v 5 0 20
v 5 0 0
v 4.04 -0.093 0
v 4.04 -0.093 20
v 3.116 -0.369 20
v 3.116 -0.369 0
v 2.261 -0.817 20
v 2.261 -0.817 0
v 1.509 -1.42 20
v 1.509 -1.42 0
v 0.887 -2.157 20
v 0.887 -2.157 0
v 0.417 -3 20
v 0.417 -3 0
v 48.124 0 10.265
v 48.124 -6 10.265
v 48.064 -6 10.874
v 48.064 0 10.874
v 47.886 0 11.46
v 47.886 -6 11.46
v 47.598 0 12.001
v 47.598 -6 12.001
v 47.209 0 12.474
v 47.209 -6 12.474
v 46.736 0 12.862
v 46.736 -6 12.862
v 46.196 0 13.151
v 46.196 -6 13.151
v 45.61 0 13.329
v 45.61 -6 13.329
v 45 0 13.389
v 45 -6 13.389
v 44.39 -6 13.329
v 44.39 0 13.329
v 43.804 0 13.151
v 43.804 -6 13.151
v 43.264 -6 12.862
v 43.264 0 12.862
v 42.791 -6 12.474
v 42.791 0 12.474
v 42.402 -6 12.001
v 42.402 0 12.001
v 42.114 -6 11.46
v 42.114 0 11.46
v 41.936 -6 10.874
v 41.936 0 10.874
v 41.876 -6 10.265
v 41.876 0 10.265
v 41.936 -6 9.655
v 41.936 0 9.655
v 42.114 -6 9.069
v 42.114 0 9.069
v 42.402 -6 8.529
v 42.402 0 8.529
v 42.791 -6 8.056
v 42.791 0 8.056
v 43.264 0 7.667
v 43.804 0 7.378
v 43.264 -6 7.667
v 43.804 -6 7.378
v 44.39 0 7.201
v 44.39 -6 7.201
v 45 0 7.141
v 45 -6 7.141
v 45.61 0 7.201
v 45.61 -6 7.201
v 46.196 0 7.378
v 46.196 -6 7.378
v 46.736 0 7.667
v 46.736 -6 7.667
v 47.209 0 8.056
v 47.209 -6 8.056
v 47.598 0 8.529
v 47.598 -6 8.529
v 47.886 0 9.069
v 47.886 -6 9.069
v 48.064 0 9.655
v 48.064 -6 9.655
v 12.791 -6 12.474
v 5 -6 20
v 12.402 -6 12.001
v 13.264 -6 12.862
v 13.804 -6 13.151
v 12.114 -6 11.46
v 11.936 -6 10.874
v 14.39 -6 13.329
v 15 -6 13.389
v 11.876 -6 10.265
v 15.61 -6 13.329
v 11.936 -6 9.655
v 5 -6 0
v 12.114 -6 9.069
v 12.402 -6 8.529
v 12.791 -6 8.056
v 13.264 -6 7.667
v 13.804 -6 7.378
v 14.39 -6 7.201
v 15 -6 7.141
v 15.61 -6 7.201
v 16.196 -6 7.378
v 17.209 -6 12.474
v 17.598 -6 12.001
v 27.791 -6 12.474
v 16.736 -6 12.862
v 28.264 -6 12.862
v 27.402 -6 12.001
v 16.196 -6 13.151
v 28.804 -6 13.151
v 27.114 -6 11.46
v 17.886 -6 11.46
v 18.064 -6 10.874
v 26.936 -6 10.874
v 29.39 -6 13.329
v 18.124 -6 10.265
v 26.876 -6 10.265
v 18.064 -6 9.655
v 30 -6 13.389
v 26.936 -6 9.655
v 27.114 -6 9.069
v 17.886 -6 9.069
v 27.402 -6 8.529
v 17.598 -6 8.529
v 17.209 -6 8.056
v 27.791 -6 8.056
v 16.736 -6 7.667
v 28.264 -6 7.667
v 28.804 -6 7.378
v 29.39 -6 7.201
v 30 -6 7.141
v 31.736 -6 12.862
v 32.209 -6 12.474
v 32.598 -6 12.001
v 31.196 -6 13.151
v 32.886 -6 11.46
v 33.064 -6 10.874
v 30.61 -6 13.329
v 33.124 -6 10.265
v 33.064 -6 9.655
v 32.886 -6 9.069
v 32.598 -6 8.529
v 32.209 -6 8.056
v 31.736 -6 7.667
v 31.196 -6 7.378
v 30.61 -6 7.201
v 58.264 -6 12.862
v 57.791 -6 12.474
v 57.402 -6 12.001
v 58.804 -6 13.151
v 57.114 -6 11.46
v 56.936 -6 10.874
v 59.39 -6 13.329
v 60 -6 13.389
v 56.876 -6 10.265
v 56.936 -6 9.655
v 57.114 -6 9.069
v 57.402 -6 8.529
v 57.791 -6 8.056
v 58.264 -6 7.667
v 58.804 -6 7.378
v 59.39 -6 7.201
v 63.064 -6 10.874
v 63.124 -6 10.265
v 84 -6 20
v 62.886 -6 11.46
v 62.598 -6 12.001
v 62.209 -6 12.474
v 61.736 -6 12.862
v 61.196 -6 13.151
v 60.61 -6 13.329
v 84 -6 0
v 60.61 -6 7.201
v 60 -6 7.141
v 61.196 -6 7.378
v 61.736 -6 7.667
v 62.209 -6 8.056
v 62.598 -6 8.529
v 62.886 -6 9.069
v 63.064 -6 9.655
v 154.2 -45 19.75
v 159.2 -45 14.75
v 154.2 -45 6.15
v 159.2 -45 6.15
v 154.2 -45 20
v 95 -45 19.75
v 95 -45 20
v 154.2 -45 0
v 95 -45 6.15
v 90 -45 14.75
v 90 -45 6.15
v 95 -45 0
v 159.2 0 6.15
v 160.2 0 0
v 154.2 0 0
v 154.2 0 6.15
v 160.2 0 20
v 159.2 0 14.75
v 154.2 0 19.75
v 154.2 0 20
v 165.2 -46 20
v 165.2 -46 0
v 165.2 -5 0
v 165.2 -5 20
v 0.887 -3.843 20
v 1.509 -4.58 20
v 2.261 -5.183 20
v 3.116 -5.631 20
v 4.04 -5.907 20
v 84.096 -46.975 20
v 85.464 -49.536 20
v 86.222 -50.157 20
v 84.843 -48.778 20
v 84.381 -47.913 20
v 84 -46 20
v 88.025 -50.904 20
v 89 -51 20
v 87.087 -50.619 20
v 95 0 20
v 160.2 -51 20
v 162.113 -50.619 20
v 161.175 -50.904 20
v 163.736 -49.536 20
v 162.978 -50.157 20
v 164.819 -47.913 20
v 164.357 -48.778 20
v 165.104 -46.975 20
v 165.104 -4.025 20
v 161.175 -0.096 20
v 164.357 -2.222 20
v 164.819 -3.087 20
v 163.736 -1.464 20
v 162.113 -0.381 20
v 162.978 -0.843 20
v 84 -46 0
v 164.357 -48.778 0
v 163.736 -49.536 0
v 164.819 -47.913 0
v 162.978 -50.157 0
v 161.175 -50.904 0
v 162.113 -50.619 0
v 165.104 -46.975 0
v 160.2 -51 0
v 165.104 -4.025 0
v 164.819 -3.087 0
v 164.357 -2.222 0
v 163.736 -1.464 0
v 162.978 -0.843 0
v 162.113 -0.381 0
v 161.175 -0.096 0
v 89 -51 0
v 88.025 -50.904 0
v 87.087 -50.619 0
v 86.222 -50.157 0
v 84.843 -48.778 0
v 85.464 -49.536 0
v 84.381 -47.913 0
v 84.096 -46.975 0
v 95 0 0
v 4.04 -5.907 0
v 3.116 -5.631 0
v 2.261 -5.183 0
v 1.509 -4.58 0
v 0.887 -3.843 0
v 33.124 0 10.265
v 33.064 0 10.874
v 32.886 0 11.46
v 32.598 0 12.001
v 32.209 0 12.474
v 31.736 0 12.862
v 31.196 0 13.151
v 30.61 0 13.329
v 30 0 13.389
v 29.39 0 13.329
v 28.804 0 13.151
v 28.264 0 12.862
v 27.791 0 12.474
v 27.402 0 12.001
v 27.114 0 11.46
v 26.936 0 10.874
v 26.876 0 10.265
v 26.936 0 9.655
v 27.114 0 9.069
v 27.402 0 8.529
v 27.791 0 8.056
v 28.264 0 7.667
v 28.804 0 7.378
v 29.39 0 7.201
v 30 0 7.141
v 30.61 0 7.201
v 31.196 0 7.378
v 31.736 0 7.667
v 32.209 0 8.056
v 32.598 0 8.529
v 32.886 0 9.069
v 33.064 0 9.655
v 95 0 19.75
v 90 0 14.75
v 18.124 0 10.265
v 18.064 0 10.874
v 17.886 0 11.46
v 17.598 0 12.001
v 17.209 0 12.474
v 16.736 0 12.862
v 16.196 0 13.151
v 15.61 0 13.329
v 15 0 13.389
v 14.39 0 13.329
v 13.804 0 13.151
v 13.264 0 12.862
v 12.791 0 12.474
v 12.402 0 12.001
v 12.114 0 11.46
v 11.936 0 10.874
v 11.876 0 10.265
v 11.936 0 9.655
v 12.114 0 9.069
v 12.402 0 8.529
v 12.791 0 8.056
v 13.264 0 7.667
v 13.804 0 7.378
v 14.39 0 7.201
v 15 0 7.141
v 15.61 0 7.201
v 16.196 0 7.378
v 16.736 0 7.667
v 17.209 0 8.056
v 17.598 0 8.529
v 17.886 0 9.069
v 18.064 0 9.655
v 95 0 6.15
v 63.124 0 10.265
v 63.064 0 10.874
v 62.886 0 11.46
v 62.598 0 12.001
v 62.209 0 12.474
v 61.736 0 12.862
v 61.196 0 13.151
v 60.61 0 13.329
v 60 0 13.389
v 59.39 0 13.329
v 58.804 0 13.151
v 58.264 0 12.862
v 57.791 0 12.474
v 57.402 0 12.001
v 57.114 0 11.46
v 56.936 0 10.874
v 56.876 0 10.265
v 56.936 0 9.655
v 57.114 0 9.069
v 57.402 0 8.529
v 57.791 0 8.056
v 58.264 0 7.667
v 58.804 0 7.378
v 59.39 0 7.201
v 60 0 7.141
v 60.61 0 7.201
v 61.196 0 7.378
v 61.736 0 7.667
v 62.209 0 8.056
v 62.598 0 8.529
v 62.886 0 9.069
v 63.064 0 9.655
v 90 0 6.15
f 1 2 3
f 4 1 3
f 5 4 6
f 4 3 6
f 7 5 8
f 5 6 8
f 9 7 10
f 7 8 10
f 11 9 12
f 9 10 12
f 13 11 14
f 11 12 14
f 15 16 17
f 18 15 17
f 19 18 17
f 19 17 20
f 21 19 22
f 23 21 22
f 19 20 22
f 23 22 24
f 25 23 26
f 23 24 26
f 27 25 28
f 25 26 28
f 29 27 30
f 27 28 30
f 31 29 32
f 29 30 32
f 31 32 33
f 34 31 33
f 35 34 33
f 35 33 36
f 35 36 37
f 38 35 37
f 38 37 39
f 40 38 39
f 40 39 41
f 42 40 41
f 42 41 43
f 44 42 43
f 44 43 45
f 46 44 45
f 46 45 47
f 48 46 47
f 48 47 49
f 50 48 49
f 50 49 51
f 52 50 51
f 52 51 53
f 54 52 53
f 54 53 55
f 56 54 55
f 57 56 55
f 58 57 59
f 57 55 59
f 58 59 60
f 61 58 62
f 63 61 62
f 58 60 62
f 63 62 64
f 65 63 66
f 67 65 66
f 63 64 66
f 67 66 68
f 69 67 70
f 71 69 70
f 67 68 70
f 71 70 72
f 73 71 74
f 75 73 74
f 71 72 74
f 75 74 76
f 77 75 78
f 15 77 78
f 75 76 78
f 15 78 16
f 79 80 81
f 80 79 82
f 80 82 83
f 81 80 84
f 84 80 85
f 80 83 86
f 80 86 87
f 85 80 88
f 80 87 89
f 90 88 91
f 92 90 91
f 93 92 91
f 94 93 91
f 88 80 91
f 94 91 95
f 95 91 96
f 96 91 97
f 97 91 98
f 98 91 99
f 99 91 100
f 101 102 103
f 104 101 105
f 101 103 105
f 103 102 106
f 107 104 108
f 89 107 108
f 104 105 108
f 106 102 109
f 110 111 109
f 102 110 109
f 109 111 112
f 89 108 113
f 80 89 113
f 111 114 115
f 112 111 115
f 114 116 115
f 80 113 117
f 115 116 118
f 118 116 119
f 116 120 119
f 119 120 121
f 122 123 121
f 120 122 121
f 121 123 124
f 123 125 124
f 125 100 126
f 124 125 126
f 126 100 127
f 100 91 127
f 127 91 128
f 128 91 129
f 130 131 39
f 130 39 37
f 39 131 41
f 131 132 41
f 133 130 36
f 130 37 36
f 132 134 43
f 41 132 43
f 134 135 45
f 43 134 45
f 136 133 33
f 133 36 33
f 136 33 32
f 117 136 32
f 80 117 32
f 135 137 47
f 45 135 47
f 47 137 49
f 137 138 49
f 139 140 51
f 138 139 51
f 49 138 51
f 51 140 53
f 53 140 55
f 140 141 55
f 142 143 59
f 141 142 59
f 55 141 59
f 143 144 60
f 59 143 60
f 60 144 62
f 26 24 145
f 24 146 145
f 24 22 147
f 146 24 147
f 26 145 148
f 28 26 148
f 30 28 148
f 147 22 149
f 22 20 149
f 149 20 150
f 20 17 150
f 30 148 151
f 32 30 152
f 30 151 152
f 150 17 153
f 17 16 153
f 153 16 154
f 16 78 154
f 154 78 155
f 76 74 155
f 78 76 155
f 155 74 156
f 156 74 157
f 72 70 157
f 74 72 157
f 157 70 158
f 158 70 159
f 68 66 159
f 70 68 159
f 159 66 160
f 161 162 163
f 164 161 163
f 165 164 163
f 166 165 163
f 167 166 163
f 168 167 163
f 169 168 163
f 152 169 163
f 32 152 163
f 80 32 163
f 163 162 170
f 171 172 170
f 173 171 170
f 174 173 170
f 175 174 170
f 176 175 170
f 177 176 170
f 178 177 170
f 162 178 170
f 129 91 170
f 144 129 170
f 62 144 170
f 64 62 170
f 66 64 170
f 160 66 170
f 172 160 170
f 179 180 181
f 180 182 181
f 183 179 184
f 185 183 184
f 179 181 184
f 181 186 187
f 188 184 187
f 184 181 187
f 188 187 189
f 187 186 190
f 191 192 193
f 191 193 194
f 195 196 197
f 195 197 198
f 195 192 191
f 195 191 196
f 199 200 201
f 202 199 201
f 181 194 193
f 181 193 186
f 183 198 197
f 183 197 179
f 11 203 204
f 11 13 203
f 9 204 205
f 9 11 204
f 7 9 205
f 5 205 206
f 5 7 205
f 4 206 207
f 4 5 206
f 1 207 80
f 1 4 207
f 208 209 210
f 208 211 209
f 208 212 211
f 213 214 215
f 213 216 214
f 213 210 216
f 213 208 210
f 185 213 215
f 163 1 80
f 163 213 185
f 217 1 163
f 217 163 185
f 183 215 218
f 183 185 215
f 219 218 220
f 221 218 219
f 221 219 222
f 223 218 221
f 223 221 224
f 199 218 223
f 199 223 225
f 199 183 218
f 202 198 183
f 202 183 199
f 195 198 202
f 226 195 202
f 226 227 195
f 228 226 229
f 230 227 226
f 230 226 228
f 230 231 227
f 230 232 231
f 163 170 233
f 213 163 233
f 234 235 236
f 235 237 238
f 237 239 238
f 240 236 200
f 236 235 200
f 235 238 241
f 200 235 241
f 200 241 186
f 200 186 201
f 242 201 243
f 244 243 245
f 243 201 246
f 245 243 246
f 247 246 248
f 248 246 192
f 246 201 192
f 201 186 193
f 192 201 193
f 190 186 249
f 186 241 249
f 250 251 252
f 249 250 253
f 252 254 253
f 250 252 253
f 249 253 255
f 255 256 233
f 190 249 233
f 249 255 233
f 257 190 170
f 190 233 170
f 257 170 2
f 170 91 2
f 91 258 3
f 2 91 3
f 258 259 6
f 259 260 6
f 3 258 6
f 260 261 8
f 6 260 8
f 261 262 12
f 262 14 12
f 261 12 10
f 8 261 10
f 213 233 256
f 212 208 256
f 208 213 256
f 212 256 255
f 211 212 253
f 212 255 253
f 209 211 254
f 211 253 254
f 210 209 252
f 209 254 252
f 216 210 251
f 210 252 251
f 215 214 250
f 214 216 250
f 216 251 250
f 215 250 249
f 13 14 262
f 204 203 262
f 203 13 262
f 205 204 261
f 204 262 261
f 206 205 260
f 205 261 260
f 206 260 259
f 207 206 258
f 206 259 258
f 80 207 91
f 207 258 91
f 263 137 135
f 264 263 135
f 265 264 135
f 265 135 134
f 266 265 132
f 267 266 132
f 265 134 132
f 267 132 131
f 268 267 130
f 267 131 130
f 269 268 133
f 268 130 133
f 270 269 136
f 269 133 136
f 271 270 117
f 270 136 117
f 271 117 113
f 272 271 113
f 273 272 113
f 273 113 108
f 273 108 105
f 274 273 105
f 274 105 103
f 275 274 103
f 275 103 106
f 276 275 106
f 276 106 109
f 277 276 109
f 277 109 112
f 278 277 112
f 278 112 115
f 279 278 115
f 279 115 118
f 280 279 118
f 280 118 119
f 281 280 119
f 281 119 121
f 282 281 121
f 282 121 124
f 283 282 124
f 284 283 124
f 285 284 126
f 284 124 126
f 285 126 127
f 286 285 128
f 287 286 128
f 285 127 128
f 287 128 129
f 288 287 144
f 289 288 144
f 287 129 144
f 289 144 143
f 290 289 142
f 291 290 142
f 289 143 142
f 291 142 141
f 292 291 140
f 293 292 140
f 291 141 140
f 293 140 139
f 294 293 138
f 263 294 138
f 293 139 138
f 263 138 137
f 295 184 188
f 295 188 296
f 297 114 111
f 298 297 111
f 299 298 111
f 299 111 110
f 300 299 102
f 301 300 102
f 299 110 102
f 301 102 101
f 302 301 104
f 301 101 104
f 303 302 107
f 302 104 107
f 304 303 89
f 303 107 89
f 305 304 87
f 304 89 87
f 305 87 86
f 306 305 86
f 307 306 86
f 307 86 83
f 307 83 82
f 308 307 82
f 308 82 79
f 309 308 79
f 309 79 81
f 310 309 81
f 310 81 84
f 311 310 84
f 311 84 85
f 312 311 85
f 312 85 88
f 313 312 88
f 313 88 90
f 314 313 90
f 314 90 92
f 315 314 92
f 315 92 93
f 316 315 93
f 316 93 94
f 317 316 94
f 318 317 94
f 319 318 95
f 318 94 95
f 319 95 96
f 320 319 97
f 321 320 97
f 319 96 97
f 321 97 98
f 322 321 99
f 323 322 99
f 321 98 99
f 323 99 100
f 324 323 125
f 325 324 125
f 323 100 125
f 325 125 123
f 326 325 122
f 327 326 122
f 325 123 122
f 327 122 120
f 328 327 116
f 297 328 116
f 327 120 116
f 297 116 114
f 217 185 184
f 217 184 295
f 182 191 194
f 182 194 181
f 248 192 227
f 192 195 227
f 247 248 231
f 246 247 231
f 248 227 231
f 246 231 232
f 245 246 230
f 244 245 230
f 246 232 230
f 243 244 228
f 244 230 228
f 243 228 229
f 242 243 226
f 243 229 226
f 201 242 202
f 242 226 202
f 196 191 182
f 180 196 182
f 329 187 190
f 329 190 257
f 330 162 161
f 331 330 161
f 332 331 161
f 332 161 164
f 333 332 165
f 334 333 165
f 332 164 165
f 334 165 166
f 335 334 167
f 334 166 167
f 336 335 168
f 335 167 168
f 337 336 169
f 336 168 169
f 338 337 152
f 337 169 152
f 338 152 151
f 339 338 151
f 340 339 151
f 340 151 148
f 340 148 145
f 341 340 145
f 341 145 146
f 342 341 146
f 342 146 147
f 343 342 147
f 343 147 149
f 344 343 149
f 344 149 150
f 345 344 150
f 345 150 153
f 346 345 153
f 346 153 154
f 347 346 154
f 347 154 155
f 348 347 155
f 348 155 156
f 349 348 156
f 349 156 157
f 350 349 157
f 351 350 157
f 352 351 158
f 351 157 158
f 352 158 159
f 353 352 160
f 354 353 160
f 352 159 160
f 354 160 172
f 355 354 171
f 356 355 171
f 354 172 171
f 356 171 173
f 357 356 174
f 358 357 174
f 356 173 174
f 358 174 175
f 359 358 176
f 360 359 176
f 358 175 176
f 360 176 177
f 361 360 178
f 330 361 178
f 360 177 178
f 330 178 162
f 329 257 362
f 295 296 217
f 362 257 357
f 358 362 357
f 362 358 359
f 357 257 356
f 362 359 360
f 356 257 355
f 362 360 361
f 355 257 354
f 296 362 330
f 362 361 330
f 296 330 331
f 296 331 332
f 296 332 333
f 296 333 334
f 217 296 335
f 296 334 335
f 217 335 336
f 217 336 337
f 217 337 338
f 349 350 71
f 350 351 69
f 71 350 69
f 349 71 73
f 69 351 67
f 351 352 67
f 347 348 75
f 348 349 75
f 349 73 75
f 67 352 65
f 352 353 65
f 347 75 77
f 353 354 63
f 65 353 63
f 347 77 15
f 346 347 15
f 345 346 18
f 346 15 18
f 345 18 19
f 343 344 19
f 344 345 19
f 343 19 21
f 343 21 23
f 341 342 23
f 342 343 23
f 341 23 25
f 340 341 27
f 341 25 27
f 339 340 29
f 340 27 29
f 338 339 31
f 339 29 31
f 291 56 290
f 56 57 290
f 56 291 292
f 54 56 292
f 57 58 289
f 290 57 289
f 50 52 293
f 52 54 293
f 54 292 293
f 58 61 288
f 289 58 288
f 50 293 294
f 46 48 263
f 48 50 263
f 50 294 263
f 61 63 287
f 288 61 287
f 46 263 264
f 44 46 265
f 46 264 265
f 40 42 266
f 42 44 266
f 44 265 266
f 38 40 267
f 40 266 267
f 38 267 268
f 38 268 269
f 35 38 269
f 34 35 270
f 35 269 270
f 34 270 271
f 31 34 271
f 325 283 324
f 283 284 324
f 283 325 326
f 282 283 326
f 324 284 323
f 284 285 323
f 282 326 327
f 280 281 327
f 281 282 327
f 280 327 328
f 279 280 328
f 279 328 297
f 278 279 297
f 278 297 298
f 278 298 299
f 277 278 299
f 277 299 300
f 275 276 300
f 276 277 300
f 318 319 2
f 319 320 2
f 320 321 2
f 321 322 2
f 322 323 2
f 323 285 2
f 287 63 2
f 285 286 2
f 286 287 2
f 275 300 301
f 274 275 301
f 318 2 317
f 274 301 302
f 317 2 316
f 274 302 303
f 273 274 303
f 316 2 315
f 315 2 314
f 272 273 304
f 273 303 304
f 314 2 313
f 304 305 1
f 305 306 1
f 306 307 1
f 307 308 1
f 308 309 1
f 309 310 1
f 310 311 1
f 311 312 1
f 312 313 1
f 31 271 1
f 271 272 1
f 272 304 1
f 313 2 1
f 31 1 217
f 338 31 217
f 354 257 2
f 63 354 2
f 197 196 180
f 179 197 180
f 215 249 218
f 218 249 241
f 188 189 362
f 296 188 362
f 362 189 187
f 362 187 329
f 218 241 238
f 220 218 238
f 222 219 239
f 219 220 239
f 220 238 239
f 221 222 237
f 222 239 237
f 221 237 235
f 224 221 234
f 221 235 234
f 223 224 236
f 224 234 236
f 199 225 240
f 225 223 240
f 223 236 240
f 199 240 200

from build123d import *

# Parameters (mm, degrees)
F1_DEPTH    = 20
F3_D        = 6.2484
F4_W        = 45
F4_H        = 6.15
F4_H_2      = 5.25
F6_DEPTH    = 5
F5_W        = 45
F5_H        = 6.15
F5_H_2      = 5.25
F7_DEPTH    = 5
F8_SIZE     = 4.99999
F9_T1_DEPTH = 45
F10_R       = 5


# Not quite as in the source:
# - a fillet or chamfer that OpenCascade refuses, or shapes differently, is made with other operations: its cross-section is extruded or revolved along the edge and cut away or added
# - a fillet or chamfer is up to 0.001 mm smaller than in the source, because OpenCascade refuses the exact size


with BuildPart() as f1:
    # F0 (on Top) → F1 (new body)
    with BuildSketch(Plane.XY):
        Polygon((90, 0), (0, 0), (0, -6), (84, -6), (84, -51), (90, -51), (165.2, -51), (165.2, -45), (165.2, 0), (159.2, 0), (159.2, -45), (90, -45), align=None)
    extrude(amount=F1_DEPTH)

    # F3 (through all)
    with Locations(Plane(origin=(0, 0, 0), x_dir=(-1, 0, 0), z_dir=(0, 1, 0))):
        with Locations((-45, 10.2648036554), (-30, 10.2648036554), (-15, 10.2648036554), (-60, 10.2648036554)):
            Hole(F3_D / 2)

    # F4 (on face) → F6 (join)
    with BuildSketch(Plane(origin=(159.2, 0, 0), x_dir=(0, -1, 0), z_dir=(-1, 0, 0))):
        with Locations((22.5, 3.075)):
            Rectangle(F4_W, F4_H)
        with Locations((22.5, 17.375)):
            Rectangle(F4_W, F4_H_2)
    extrude(amount=F6_DEPTH)

    # F5 (on face) → F7 (join)
    with BuildSketch(Plane.YZ.offset(90)):
        with Locations((-22.5, 3.075)):
            Rectangle(F5_W, F5_H)
        with Locations((-22.5, 17.375)):
            Rectangle(F5_W, F5_H_2)
    extrude(amount=F7_DEPTH)

    # F8 (size 5 in the source; OpenCascade refuses exactly that, so slightly less here)
    f8_edges = [f1.edges().sort_by_distance(p)[0] for p in [
        (154.2, -22.5, 14.75),
        (95, -22.5, 14.75),
    ]]
    chamfer(f8_edges, length=F8_SIZE)

    # F9: fillet of radius 5 on 4 edges, made by hand

    # F9_s2 → F9_t1 (cut)
    with BuildSketch(Plane.XY.offset(-12.5)):
        with BuildLine():
            ThreePointArc((160.2, -51), (163.7355339059, -49.5355339059), (165.2, -46))
            Line((165.2, -46), (165.2, -51))
            Line((165.2, -51), (160.2, -51))
        make_face()
        with BuildLine():
            ThreePointArc((84, -46), (85.4644660941, -49.5355339059), (89, -51))
            Line((89, -51), (84, -51))
            Line((84, -51), (84, -46))
        make_face()
        with BuildLine():
            ThreePointArc((5, 0), (1.4644660941, -1.4644660941), (0, -5))
            Line((0, -5), (0, 0))
            Line((0, 0), (5, 0))
        make_face()
        with BuildLine():
            ThreePointArc((0, -1), (1.4644660941, -4.5355339059), (5, -6))
            Line((5, -6), (0, -6))
            Line((0, -6), (0, -1))
        make_face()
    extrude(amount=F9_T1_DEPTH, mode=Mode.SUBTRACT)

    # F10
    f10_edges = [f1.edges().sort_by_distance(p)[0] for p in [
        (165.2, 0, 10),
    ]]
    fillet(f10_edges, radius=F10_R)


solid = f1.part
